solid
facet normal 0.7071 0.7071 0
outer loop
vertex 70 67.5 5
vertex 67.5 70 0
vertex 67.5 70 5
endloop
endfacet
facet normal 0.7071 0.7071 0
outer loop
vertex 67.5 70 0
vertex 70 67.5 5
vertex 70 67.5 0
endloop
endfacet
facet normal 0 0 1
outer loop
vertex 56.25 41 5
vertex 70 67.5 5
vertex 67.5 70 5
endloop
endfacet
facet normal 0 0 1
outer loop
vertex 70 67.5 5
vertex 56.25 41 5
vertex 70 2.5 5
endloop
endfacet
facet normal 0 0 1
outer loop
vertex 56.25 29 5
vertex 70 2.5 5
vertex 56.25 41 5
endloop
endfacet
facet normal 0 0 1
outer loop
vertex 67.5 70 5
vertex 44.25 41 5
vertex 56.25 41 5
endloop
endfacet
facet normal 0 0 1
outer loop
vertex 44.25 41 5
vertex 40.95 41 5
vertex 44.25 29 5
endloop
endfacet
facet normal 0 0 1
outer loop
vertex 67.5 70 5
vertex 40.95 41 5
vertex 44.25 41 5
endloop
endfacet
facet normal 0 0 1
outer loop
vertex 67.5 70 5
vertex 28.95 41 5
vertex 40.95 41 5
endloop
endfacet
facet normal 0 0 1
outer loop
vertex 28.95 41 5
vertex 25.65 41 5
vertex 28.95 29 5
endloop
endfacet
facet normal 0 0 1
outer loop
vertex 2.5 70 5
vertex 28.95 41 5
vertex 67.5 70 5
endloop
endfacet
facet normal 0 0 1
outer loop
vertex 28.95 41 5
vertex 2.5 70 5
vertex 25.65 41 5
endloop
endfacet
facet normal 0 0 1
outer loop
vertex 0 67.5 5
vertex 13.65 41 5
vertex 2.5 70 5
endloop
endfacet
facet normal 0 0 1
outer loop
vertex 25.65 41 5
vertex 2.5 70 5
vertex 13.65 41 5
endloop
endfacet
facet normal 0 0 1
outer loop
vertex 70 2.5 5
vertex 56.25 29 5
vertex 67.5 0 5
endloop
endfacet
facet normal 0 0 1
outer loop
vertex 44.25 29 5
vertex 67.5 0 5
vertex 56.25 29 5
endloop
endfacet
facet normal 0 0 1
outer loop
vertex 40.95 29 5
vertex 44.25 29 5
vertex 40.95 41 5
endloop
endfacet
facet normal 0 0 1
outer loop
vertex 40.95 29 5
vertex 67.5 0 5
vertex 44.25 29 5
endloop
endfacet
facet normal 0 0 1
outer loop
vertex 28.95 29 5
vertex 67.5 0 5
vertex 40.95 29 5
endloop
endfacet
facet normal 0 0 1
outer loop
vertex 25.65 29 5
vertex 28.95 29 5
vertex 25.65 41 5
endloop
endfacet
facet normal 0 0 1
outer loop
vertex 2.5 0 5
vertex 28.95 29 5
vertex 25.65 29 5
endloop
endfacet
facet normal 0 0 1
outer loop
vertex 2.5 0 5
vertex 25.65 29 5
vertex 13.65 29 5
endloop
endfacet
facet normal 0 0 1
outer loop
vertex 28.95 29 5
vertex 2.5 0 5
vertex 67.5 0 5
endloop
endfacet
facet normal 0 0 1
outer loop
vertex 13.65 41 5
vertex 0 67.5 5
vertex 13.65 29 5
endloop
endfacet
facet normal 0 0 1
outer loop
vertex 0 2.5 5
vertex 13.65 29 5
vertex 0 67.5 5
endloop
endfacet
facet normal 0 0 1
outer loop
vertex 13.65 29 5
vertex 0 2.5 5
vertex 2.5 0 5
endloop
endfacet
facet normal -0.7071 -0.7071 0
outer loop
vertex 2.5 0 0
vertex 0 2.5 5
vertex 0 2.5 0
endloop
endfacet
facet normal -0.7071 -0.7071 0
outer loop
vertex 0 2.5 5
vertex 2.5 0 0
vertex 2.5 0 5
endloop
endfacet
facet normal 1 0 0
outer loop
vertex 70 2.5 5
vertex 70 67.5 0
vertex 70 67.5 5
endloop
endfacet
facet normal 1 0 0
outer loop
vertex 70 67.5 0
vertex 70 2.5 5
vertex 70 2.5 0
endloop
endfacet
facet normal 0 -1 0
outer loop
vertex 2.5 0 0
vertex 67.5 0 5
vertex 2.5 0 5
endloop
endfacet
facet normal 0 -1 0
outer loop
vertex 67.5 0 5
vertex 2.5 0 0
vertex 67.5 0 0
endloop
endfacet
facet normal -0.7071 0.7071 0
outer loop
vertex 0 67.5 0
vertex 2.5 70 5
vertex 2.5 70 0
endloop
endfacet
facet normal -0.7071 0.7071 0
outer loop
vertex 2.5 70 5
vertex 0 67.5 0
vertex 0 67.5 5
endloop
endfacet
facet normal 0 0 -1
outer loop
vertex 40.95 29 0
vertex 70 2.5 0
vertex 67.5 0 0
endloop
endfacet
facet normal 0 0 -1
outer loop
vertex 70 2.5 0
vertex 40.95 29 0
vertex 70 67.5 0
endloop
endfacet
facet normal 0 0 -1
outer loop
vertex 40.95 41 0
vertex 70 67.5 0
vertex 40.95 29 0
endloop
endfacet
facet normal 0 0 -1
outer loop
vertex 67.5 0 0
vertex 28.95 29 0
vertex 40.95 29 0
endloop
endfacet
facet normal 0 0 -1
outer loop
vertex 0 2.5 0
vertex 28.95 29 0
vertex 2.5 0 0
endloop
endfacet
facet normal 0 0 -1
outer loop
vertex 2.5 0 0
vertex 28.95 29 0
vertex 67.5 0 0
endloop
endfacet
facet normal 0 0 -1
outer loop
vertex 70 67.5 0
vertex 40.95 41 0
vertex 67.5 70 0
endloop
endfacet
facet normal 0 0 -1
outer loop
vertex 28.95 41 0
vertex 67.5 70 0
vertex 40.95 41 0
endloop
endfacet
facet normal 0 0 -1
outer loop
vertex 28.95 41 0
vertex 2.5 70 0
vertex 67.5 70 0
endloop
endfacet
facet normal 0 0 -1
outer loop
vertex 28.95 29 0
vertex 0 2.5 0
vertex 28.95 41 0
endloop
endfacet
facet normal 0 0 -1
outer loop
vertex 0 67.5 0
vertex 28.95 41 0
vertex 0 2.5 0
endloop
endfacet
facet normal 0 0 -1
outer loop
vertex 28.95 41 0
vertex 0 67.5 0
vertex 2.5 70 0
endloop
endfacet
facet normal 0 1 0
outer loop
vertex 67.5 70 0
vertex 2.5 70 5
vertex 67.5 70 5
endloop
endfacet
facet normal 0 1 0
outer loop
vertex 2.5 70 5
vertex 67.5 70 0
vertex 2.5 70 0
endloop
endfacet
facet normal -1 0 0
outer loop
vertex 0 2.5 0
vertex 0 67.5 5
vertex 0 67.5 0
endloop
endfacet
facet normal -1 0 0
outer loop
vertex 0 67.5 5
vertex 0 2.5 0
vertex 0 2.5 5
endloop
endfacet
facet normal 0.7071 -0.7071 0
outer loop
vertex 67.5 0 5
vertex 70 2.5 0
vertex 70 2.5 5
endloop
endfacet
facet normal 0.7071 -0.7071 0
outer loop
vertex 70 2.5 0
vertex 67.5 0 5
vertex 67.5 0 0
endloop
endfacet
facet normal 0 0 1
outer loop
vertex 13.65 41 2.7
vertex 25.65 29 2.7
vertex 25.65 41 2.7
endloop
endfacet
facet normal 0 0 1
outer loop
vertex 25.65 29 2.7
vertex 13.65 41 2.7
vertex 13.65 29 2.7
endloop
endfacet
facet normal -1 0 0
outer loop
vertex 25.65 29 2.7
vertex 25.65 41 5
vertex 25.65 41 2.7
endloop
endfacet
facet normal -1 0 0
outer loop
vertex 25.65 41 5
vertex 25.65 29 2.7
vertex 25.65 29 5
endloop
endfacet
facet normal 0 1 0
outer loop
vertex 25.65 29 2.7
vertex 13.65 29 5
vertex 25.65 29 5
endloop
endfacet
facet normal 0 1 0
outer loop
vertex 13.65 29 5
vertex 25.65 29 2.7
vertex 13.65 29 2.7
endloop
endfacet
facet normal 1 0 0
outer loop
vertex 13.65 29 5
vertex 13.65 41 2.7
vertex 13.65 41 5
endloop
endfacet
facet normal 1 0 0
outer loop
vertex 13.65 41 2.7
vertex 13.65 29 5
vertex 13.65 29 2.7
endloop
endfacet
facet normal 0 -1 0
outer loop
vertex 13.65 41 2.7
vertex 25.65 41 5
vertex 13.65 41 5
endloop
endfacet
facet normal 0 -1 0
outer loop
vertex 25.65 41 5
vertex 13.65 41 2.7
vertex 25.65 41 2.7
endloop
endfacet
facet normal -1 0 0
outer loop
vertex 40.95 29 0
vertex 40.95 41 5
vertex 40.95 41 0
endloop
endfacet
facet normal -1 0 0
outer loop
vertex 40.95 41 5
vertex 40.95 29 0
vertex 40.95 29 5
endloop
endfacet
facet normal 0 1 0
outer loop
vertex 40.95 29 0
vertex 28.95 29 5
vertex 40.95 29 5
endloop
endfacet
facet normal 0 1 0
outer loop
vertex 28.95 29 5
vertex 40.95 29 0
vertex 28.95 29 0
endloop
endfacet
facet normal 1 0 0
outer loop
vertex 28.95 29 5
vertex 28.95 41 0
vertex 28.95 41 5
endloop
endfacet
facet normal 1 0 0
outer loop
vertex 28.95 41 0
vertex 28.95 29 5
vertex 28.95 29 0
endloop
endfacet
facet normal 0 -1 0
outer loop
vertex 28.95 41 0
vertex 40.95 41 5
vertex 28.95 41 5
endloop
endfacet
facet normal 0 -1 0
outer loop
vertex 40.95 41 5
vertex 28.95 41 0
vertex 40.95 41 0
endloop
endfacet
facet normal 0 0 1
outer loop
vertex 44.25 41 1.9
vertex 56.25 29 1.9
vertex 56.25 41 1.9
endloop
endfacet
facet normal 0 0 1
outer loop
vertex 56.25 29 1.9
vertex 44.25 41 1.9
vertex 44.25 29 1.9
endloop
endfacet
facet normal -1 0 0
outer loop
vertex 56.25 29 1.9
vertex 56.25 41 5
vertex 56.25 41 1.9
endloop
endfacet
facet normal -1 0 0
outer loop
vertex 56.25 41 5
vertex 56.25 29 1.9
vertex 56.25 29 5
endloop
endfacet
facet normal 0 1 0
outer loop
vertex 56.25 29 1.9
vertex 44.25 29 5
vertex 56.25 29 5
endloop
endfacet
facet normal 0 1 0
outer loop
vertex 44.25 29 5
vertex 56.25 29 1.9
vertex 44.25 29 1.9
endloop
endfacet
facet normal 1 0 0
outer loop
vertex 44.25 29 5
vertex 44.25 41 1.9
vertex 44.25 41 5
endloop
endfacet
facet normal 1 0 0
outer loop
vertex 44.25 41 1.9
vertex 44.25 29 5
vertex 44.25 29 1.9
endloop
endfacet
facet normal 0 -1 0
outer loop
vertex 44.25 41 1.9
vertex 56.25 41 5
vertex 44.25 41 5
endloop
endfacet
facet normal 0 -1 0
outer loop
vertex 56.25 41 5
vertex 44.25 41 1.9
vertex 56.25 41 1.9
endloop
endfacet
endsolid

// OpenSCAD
$fn = 32;

// ----------------------------------------------------------------------
// Windowed plate: 3 voids, 70 x 70 x 5 mm
// ----------------------------------------------------------------------

// --- parameters (mm) ---
plate_l = 70;             // plate length, X
plate_w = 70;             // plate width, Y
plate_t = 5;              // plate thickness, Z
edge_margin = 12;         // wall from the plate edge to any window
windows = 3;              // number of windows in the row
win_l = 12;               // window length
win_w = 12;               // window width
win_pitch = 15.3;         // window pitch along X
depth_1 = 2.3;            // depth of void 1 (full thickness = through)
depth_2 = 5;              // depth of void 2 (full thickness = through)
depth_3 = 3.1;            // depth of void 3 (full thickness = through)
corner_c = 2.5;           // corner chamfer of the plate

profile = [[2.5, 0], [67.5, 0], [70, 2.5], [70, 67.5], [67.5, 70], [2.5, 70], [0, 67.5], [0, 2.5]];  // primary outline, 8 points, counter clockwise
void_1 = [[13.65, 29], [25.65, 29], [25.65, 41], [13.65, 41]];  // window 1 of the row, 4 points
void_2 = [[28.95, 29], [40.95, 29], [40.95, 41], [28.95, 41]];  // window 2 of the row, 4 points
void_3 = [[44.25, 29], [56.25, 29], [56.25, 41], [44.25, 41]];  // window 3 of the row, 4 points

// --- the one profile operation ---
difference() {
  linear_extrude(height = plate_t) polygon(points = profile);
  translate([0, 0, plate_t - depth_1])
    linear_extrude(height = depth_1 + 1) polygon(points = void_1);
  translate([0, 0, -1])
    linear_extrude(height = plate_t + 2) polygon(points = void_2);
  translate([0, 0, plate_t - depth_3])
    linear_extrude(height = depth_3 + 1) polygon(points = void_3);
}
